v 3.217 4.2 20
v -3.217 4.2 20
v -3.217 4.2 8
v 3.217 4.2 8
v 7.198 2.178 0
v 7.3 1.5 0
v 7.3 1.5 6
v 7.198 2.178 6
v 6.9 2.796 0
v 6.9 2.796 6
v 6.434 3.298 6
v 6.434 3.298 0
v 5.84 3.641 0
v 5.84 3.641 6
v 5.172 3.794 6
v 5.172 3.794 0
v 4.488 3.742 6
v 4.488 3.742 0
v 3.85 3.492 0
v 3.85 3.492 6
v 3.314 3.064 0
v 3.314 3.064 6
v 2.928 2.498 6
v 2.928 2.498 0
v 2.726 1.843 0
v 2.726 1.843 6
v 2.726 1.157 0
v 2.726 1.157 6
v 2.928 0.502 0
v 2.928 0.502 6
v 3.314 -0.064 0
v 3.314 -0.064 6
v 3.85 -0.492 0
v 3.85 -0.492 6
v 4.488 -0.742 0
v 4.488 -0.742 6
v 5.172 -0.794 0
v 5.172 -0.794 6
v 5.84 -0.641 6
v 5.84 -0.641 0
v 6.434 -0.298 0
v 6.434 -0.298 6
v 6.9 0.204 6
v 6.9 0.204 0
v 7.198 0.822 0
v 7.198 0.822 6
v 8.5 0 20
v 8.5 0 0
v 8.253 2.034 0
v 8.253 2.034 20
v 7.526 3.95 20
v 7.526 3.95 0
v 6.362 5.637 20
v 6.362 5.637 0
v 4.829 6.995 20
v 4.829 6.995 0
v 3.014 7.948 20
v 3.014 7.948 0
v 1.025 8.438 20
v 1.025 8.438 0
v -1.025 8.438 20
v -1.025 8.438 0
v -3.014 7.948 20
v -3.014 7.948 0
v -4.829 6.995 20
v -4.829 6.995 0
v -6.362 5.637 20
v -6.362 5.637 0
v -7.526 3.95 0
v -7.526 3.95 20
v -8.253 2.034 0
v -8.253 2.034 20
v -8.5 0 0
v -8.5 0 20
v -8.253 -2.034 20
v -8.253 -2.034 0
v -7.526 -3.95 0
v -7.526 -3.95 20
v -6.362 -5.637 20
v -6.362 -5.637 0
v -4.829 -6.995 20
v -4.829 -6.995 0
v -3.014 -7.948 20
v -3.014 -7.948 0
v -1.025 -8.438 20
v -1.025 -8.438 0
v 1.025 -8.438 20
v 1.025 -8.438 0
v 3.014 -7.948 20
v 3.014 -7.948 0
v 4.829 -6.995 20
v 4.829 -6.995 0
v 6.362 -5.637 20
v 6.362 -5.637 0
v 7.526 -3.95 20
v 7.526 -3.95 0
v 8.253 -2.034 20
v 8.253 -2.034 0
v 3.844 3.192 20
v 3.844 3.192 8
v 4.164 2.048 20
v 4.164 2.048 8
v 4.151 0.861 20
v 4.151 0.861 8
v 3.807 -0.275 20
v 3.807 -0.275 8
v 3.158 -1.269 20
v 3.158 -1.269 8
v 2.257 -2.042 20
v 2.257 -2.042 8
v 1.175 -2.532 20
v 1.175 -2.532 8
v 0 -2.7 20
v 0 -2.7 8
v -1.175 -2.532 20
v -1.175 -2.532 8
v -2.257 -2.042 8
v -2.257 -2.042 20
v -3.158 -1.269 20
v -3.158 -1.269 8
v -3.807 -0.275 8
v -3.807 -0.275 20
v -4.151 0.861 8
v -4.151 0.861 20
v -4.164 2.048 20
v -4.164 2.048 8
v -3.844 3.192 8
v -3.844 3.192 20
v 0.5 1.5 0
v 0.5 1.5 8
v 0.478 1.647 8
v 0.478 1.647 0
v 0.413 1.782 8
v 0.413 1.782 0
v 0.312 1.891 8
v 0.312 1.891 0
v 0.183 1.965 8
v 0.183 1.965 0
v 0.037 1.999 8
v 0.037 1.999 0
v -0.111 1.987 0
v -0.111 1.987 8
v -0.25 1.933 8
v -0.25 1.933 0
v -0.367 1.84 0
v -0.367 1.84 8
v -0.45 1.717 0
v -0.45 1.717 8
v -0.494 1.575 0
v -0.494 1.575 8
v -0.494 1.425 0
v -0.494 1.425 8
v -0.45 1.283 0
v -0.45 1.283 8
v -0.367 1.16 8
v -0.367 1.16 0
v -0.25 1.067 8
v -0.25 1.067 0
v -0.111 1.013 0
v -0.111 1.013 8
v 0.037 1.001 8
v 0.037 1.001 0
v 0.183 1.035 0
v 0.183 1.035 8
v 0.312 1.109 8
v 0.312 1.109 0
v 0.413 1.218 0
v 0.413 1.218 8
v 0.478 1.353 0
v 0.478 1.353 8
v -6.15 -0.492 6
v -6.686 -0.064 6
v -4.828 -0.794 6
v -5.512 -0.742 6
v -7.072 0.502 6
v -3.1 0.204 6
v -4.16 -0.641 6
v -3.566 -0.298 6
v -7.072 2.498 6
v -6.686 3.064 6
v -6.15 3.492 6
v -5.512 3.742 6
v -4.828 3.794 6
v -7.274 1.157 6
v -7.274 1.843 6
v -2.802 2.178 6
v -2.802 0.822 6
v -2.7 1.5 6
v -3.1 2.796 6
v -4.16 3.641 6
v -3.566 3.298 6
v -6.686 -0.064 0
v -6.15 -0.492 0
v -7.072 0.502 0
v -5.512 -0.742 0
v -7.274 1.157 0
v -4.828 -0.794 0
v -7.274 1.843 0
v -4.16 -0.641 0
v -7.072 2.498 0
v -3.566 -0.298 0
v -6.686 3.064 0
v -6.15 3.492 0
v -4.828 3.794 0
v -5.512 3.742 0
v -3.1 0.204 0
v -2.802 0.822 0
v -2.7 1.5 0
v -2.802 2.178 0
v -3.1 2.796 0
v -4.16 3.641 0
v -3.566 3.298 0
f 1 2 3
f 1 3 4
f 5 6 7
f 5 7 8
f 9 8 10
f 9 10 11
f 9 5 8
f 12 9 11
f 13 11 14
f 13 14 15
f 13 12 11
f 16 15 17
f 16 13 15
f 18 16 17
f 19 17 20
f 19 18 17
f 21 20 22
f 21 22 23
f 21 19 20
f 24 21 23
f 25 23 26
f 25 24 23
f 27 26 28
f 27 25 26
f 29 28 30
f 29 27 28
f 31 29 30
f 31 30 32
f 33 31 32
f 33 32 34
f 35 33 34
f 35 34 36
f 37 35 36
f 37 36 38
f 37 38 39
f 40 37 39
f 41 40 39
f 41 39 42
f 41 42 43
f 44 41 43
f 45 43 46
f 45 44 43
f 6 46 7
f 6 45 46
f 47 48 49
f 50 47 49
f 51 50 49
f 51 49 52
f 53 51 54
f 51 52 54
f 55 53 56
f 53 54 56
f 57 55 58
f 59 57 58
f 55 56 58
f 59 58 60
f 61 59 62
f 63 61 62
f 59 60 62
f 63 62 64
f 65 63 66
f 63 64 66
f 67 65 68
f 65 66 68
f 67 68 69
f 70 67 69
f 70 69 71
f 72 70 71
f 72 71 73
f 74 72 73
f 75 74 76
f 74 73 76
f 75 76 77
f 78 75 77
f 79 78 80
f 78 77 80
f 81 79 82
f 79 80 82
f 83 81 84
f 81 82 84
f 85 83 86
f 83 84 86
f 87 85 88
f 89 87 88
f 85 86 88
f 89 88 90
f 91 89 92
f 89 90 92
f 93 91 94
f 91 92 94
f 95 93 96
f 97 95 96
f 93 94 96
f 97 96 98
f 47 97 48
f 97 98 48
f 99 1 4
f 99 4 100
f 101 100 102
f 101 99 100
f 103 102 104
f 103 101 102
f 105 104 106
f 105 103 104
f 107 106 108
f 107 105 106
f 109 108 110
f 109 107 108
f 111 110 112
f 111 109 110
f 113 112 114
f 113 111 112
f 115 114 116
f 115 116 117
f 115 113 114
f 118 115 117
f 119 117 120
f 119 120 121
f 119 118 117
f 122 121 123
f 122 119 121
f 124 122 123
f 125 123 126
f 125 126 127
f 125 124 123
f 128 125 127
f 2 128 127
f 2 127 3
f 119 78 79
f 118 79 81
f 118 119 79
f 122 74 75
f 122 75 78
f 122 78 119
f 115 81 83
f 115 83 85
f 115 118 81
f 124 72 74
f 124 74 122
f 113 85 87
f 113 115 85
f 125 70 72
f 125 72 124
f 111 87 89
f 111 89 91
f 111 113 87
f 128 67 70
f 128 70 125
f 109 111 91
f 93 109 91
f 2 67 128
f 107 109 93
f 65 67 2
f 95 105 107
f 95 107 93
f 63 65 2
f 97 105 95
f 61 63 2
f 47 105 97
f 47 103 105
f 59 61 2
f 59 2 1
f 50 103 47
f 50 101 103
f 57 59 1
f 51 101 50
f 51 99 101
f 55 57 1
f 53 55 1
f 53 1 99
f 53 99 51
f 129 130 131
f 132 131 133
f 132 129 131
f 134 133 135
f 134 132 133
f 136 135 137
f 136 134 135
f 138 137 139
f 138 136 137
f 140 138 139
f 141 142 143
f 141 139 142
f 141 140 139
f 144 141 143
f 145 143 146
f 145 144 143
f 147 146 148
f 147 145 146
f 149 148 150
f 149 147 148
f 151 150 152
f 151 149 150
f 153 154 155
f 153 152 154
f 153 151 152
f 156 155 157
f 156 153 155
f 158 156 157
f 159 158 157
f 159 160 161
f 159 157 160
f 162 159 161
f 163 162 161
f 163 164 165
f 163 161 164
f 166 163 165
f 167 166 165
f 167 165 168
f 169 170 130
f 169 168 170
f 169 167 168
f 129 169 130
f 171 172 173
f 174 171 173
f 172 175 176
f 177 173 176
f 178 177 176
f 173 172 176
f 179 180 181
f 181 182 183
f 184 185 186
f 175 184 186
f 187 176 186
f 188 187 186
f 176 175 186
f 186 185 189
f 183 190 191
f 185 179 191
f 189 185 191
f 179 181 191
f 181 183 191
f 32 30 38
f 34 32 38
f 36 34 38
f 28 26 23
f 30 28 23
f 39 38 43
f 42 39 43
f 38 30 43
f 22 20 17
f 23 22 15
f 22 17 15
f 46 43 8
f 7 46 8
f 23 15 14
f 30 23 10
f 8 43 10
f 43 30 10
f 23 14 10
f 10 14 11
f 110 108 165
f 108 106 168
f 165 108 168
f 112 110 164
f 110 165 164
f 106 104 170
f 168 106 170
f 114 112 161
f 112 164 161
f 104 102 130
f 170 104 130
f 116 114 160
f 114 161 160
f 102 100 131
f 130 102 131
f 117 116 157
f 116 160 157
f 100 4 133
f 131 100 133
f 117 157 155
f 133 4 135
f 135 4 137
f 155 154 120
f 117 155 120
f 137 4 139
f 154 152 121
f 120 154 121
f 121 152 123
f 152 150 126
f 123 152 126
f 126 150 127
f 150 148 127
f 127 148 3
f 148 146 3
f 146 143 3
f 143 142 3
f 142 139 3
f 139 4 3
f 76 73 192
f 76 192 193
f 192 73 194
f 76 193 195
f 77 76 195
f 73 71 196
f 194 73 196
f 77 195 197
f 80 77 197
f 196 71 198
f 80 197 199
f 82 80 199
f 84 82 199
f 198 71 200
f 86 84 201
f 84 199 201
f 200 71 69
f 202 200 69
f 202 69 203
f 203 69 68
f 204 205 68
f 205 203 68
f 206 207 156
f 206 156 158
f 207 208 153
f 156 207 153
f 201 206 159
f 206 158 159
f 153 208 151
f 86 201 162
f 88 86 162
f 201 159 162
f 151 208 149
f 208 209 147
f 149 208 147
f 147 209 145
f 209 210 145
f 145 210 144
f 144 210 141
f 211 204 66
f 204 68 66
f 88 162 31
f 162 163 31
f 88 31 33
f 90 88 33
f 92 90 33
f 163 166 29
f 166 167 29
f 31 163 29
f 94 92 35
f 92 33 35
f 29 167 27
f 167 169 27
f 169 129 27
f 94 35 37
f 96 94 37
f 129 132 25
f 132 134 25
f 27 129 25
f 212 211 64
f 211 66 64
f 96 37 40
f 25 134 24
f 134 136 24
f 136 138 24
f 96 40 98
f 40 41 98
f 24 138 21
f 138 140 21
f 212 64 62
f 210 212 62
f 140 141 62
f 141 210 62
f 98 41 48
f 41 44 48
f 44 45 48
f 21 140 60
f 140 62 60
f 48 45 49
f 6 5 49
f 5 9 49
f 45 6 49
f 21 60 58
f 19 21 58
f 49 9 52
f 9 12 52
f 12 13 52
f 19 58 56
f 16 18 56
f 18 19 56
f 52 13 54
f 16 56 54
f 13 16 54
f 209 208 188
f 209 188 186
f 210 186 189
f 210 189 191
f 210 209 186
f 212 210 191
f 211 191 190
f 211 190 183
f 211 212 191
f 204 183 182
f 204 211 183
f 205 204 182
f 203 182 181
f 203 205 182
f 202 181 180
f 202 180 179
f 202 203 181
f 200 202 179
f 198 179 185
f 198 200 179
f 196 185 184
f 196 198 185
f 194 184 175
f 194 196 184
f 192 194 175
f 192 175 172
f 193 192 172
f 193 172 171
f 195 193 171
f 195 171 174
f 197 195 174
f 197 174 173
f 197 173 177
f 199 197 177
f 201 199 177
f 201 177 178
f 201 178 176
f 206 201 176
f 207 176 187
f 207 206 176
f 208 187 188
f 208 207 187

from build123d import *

# Parameters (mm, degrees)
SKETCH2_R           = 8.5
SKETCH2_R_2         = 0.5
BOSS_EXTRUDE1_DEPTH = 20
SKETCH3_R           = 0.5
SKETCH3_R_2         = 2.3
CUT_EXTRUDE1_DEPTH  = 6
CUT_EXTRUDE2_DEPTH  = 12


with BuildPart() as part:
    # Sketch2 → Boss-Extrude1 (new body)
    with BuildSketch(Plane.XY):
        Circle(SKETCH2_R)
        with Locations((0, 1.5)):
            Circle(SKETCH2_R_2, mode=Mode.SUBTRACT)
    extrude(amount=BOSS_EXTRUDE1_DEPTH)

    # Sketch3 → Cut-Extrude1 (cut)
    with BuildSketch(Plane.XY):
        with Locations((0, 1.5)):
            Circle(SKETCH3_R)
        with Locations((-5, 1.5)):
            Circle(SKETCH3_R_2)
        with Locations((5, 1.5)):
            Circle(SKETCH3_R_2)
    extrude(amount=CUT_EXTRUDE1_DEPTH, mode=Mode.SUBTRACT)

    # Sketch5 → Cut-Extrude2 (cut)
    with BuildSketch(Plane.XY.offset(20)):
        with BuildLine():
            Line((-3.217141588, 4.2), (3.217141588, 4.2))
            ThreePointArc((3.217141588, 4.2), (0, -2.7), (-3.217141588, 4.2))
        make_face()
    extrude(amount=-CUT_EXTRUDE2_DEPTH, mode=Mode.SUBTRACT)


solid = part.part
